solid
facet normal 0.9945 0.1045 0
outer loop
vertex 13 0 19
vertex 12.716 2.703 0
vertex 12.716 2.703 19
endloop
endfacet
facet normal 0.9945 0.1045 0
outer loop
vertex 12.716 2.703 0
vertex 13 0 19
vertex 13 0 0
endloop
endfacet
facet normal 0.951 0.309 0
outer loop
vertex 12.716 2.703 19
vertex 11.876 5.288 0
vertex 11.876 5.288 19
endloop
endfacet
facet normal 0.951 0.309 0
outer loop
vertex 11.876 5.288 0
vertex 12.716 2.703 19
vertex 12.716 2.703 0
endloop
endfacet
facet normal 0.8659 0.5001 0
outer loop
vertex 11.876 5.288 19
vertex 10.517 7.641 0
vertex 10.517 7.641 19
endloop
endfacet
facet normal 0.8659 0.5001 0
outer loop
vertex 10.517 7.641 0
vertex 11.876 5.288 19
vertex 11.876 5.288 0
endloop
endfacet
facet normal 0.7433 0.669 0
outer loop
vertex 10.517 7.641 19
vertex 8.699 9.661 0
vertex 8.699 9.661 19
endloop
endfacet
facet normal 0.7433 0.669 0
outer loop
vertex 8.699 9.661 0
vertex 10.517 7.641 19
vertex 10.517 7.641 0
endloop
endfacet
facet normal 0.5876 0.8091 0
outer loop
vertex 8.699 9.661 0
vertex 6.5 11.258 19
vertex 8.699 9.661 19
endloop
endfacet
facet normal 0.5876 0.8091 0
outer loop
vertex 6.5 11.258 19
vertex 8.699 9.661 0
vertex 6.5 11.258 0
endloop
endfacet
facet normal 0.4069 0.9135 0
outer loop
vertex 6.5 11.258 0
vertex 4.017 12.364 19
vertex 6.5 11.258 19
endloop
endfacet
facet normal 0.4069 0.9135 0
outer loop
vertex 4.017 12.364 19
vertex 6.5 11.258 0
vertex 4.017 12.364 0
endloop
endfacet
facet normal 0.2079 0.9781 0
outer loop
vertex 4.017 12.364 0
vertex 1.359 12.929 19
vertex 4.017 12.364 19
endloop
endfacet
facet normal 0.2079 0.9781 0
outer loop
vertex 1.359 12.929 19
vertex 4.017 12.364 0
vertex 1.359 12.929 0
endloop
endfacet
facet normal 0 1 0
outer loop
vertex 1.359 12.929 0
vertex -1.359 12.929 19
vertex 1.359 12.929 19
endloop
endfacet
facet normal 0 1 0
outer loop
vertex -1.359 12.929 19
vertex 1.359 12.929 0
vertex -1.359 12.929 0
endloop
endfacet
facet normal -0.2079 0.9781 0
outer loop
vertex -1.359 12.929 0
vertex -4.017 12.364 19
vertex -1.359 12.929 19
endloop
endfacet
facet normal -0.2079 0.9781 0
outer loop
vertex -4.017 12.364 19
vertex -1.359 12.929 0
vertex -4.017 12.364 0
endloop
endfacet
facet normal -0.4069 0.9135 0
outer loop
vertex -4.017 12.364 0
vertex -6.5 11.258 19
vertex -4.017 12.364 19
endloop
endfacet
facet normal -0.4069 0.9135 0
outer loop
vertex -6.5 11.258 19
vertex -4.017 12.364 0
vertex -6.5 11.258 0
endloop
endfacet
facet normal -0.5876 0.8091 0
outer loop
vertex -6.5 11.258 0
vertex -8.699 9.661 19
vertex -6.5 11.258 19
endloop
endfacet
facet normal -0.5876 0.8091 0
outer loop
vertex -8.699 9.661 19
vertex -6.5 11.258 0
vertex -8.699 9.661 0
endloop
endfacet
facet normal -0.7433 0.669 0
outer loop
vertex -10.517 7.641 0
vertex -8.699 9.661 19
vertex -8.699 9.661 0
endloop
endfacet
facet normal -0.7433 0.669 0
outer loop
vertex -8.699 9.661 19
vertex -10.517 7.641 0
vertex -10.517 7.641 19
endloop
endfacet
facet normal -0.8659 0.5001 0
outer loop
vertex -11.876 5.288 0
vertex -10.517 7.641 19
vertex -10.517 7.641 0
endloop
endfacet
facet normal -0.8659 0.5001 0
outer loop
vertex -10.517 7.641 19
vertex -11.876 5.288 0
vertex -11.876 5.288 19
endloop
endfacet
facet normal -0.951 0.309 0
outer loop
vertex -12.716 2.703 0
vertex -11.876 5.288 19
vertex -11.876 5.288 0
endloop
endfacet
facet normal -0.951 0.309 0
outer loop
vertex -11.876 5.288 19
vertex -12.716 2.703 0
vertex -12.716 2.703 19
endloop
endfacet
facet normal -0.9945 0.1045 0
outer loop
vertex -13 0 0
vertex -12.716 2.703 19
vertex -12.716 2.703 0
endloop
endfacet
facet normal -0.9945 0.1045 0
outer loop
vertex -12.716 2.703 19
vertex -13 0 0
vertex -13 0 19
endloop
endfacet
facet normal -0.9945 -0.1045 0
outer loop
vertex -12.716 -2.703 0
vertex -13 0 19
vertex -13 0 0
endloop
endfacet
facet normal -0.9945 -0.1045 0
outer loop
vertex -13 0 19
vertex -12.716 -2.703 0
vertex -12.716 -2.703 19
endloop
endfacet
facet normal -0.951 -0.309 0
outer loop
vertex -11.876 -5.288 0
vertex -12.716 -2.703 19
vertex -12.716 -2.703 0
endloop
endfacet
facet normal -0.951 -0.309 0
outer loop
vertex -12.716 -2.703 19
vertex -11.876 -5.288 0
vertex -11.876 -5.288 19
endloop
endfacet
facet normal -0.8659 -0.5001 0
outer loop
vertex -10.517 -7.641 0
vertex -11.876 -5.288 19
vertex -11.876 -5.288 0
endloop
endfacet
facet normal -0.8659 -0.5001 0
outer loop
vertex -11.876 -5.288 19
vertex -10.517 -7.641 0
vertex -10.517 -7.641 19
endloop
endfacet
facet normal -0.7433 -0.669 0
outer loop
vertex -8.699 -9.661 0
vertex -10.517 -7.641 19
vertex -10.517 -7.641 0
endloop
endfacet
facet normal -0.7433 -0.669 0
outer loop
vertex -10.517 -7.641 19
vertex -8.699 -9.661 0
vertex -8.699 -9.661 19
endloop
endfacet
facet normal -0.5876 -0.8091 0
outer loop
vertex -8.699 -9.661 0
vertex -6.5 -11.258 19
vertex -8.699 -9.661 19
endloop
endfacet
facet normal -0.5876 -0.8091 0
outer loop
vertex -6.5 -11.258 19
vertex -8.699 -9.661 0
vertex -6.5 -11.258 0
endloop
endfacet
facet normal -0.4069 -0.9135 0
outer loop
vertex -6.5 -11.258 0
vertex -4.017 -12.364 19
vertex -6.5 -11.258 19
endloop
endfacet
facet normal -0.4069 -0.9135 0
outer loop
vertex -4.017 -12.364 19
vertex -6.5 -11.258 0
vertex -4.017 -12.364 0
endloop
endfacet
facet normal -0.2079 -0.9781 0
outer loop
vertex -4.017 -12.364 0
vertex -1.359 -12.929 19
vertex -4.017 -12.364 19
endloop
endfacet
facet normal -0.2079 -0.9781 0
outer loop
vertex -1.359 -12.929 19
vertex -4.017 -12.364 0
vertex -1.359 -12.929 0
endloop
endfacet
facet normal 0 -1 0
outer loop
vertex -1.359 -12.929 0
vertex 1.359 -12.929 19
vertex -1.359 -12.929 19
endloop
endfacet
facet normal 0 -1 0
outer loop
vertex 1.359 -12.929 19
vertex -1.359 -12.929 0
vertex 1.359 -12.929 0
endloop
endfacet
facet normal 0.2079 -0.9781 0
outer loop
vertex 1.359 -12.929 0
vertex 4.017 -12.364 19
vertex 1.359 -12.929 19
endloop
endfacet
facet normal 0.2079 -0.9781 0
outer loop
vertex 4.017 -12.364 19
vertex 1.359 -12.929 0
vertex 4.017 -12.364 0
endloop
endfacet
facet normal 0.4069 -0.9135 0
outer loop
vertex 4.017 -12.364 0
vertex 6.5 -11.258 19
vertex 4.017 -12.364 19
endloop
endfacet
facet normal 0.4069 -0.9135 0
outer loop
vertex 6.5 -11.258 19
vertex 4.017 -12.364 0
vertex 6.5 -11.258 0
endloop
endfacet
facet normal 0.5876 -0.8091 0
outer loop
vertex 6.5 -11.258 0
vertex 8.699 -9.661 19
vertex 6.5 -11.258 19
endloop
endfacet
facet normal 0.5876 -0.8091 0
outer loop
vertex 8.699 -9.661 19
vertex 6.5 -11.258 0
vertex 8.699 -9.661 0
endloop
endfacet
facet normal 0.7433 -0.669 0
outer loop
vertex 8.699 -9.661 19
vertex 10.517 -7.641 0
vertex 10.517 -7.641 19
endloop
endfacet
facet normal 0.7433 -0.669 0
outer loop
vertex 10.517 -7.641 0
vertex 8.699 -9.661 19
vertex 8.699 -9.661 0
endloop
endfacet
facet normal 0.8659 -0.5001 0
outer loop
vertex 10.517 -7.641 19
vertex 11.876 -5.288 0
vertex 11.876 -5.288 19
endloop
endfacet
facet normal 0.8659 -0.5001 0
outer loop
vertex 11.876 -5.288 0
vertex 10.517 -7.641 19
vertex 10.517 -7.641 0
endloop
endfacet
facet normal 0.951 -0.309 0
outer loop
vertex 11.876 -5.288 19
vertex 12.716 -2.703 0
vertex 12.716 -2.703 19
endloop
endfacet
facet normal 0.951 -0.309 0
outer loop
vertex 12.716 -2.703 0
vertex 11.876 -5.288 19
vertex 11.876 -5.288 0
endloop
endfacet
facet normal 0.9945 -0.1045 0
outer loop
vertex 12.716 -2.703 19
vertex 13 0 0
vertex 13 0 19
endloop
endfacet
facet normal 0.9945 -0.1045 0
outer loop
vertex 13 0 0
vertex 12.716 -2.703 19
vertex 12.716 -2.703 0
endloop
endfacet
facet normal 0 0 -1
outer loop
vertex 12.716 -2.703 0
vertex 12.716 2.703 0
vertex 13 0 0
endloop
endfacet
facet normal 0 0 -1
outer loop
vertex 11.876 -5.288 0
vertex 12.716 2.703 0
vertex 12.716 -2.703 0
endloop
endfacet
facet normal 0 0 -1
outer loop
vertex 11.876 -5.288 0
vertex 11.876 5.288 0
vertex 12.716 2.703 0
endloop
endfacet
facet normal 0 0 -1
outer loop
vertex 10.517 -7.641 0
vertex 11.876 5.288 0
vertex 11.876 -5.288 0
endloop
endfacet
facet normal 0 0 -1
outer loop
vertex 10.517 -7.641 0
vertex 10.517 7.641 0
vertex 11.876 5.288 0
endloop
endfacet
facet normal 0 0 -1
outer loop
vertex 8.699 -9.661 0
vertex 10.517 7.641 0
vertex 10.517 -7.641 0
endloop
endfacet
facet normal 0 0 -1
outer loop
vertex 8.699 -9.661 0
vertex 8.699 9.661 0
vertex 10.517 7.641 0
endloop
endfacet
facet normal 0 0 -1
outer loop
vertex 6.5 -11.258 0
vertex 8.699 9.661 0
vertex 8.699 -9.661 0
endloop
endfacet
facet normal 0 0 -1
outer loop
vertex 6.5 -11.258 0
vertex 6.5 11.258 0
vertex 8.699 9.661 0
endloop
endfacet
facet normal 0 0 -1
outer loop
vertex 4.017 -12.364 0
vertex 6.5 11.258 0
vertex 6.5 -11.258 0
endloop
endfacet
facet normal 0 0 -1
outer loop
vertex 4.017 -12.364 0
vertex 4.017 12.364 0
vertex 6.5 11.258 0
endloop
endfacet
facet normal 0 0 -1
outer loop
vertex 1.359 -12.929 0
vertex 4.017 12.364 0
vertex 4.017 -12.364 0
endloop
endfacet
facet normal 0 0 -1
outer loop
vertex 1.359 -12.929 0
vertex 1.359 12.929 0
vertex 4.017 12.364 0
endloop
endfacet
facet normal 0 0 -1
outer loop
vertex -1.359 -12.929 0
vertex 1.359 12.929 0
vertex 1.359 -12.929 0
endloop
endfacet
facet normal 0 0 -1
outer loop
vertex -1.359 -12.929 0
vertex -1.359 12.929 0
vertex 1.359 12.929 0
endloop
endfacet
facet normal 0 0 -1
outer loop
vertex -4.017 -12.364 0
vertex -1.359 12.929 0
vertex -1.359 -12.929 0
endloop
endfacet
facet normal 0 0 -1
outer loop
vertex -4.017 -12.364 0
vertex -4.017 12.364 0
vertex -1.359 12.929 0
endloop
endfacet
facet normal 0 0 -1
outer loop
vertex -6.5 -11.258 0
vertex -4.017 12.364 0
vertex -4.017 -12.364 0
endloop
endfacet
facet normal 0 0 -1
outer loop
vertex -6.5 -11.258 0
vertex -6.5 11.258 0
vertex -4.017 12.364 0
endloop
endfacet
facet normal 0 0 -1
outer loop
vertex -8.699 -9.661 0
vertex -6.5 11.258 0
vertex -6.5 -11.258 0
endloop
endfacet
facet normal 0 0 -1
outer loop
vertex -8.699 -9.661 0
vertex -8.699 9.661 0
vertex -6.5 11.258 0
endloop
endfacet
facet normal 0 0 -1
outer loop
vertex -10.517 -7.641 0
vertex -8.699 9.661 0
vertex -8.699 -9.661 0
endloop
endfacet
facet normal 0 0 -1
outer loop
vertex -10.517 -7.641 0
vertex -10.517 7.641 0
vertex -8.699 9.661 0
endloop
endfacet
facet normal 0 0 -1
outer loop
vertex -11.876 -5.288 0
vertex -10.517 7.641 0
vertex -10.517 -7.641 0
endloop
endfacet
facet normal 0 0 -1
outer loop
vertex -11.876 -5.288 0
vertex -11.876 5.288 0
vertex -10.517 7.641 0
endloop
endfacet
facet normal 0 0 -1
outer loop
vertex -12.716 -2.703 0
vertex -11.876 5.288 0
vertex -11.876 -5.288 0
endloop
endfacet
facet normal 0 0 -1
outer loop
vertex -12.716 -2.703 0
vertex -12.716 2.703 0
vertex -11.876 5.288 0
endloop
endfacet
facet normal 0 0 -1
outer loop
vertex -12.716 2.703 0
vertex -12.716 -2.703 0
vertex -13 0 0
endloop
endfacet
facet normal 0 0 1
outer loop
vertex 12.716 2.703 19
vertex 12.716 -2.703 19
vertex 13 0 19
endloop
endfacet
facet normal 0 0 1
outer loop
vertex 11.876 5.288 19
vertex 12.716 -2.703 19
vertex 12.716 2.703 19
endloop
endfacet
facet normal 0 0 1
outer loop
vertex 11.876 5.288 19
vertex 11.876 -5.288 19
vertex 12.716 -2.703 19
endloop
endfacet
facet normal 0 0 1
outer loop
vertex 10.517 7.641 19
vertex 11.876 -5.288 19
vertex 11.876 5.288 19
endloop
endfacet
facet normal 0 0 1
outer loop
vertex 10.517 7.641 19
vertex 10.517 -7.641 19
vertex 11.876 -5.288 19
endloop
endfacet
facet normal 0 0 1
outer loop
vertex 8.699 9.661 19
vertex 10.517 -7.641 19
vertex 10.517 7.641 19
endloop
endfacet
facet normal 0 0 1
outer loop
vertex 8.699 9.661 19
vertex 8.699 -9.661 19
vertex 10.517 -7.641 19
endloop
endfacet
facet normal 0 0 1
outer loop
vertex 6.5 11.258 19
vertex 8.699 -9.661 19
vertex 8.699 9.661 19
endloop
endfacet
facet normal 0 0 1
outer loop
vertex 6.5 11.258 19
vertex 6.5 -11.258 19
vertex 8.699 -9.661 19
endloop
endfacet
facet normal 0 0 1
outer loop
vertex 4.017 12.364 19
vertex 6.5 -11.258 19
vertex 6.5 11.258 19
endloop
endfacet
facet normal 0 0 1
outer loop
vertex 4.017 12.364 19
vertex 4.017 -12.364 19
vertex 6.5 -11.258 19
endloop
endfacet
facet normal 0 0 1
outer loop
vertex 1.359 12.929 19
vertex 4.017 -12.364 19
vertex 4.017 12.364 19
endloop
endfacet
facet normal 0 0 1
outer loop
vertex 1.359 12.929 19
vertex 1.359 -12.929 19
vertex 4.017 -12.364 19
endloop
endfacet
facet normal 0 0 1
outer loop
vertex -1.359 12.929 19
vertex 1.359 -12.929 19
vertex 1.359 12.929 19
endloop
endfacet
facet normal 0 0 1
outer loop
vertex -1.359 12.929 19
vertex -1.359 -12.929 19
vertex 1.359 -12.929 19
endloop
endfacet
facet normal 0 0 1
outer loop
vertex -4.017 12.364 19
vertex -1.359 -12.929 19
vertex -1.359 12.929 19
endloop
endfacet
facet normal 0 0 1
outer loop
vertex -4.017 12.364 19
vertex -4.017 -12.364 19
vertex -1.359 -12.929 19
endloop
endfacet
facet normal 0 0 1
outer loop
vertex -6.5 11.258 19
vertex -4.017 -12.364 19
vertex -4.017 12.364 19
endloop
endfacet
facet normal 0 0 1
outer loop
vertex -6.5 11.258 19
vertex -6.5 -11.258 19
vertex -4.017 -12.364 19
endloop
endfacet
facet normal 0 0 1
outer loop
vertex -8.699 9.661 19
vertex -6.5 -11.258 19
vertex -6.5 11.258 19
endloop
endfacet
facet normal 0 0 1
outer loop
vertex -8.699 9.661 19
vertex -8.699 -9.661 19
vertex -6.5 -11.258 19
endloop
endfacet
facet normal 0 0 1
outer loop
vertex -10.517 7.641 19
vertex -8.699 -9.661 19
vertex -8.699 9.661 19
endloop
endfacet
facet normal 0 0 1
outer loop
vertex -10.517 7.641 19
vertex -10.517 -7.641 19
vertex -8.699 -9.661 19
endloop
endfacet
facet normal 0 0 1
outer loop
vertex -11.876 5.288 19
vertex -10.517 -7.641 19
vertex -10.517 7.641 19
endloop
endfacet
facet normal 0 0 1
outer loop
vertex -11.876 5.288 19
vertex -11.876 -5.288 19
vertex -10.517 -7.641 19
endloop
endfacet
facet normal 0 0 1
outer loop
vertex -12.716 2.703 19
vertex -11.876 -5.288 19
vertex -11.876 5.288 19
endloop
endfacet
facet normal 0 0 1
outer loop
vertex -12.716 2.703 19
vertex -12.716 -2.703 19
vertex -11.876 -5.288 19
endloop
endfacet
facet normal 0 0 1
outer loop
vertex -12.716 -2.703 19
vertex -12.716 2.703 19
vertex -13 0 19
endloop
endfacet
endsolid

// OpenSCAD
// Generated by SolidPython 1.0.1 on 2020-07-29 00:46:45


cylinder(h = 19, r1 = 13, r2 = 13);
/***********************************************
*********      SolidPython code:      **********
************************************************
 
# import packages: SolidPython
from solid import *
from solid.utils import *
from itertools import chain, combinations, permutations


class Resize:

    def __init__(self, scad_file):
        self.scad_file = scad_file
        #self.scad_file = import_scad(scad_file)
        # cone/cylinder param:
        self.r1 = 0
        self.r2 = 0
        self.h = 0
        # rectangular prism param:
        self.w = 0
        self.l = 0
        # ellipse param:
        self.r = 0

    # import OpenScad code (file name corresponds to shape)


    # classify shape + parameters
    def assign(self, param1, param2, param3):
        if self.scad_file == 'cone.scad':
            self.r1 = param1
            self.r2 = param2
            self.h = param3
        elif self.scad_file == 'cylinder.scad':
            self.r1 = param1
            self.r2 = param2
            self.h = param3
        elif self.scad_file == 'rectangularPrism.scad':
            self.h = param1
            self.l = param2
            self.w = param3
        else:
            self.r = param1
            self.h = param2

    # resize parameters
    def iterate(self):
        x = range(3, 20, 2)
        i = 1
        if self.scad_file == 'cone.scad':
            tempList = list(permutations(x, 2))
            for temp in tempList:
                param1 = temp[0]
                param2 = temp[1]
                filepath = 'produced_scad_files/' + 'cone' + str(param1) + '_' + str(param2) + '_' + '.scad'
                scad_render_to_file(cylinder(h=param1, r1=param2, r2=0), filepath)

        elif self.scad_file == 'cylinder.scad':
            tempList = list(permutations(x, 3))
            for temp in tempList:
                param1 = temp[0]
                param2 = temp[1]
                filepath = 'produced_scad_files/' + 'cylinder' + str(param1) + '_' + str(param2) + '_' + '.scad'
                scad_render_to_file(cylinder(h=param1, r1=param2, r2=param2), filepath)

        elif self.scad_file == 'rectangularPrism.scad':
            tempList = list(permutations(x, 3))
            for temp in tempList:
                param1 = temp[0]
                param2 = temp[1]
                param3 = temp[2]
                filepath = 'produced_scad_files/' + 'rectangularPrism' + str(param1) + '_' + str(param2) + '_' + str(
                    param3) + '.scad'
                scad_render_to_file(cube(size=(param1, param2, param3)), filepath)

        elif self.scad_file == 'ellipse.scad':
            tempList = list(permutations(x, 4))
            for temp in tempList:
                param1 = temp[0]
                param2 = temp[1]
                param3 = temp[2]
                param4 = temp[3]
                filepath = 'produced_scad_files/' + 'ellipse' + str(param1) + '_' + str(param2) + '_' + str(param3) + '_' + str(param4) + '.scad'
                scad_render_to_file(scale([param1, param2, param3])(sphere(r=param4)), filepath)

    def render_to_scadfile(self):
        scad_render_to_file(scad, 'example.scad') 
 
************************************************/
